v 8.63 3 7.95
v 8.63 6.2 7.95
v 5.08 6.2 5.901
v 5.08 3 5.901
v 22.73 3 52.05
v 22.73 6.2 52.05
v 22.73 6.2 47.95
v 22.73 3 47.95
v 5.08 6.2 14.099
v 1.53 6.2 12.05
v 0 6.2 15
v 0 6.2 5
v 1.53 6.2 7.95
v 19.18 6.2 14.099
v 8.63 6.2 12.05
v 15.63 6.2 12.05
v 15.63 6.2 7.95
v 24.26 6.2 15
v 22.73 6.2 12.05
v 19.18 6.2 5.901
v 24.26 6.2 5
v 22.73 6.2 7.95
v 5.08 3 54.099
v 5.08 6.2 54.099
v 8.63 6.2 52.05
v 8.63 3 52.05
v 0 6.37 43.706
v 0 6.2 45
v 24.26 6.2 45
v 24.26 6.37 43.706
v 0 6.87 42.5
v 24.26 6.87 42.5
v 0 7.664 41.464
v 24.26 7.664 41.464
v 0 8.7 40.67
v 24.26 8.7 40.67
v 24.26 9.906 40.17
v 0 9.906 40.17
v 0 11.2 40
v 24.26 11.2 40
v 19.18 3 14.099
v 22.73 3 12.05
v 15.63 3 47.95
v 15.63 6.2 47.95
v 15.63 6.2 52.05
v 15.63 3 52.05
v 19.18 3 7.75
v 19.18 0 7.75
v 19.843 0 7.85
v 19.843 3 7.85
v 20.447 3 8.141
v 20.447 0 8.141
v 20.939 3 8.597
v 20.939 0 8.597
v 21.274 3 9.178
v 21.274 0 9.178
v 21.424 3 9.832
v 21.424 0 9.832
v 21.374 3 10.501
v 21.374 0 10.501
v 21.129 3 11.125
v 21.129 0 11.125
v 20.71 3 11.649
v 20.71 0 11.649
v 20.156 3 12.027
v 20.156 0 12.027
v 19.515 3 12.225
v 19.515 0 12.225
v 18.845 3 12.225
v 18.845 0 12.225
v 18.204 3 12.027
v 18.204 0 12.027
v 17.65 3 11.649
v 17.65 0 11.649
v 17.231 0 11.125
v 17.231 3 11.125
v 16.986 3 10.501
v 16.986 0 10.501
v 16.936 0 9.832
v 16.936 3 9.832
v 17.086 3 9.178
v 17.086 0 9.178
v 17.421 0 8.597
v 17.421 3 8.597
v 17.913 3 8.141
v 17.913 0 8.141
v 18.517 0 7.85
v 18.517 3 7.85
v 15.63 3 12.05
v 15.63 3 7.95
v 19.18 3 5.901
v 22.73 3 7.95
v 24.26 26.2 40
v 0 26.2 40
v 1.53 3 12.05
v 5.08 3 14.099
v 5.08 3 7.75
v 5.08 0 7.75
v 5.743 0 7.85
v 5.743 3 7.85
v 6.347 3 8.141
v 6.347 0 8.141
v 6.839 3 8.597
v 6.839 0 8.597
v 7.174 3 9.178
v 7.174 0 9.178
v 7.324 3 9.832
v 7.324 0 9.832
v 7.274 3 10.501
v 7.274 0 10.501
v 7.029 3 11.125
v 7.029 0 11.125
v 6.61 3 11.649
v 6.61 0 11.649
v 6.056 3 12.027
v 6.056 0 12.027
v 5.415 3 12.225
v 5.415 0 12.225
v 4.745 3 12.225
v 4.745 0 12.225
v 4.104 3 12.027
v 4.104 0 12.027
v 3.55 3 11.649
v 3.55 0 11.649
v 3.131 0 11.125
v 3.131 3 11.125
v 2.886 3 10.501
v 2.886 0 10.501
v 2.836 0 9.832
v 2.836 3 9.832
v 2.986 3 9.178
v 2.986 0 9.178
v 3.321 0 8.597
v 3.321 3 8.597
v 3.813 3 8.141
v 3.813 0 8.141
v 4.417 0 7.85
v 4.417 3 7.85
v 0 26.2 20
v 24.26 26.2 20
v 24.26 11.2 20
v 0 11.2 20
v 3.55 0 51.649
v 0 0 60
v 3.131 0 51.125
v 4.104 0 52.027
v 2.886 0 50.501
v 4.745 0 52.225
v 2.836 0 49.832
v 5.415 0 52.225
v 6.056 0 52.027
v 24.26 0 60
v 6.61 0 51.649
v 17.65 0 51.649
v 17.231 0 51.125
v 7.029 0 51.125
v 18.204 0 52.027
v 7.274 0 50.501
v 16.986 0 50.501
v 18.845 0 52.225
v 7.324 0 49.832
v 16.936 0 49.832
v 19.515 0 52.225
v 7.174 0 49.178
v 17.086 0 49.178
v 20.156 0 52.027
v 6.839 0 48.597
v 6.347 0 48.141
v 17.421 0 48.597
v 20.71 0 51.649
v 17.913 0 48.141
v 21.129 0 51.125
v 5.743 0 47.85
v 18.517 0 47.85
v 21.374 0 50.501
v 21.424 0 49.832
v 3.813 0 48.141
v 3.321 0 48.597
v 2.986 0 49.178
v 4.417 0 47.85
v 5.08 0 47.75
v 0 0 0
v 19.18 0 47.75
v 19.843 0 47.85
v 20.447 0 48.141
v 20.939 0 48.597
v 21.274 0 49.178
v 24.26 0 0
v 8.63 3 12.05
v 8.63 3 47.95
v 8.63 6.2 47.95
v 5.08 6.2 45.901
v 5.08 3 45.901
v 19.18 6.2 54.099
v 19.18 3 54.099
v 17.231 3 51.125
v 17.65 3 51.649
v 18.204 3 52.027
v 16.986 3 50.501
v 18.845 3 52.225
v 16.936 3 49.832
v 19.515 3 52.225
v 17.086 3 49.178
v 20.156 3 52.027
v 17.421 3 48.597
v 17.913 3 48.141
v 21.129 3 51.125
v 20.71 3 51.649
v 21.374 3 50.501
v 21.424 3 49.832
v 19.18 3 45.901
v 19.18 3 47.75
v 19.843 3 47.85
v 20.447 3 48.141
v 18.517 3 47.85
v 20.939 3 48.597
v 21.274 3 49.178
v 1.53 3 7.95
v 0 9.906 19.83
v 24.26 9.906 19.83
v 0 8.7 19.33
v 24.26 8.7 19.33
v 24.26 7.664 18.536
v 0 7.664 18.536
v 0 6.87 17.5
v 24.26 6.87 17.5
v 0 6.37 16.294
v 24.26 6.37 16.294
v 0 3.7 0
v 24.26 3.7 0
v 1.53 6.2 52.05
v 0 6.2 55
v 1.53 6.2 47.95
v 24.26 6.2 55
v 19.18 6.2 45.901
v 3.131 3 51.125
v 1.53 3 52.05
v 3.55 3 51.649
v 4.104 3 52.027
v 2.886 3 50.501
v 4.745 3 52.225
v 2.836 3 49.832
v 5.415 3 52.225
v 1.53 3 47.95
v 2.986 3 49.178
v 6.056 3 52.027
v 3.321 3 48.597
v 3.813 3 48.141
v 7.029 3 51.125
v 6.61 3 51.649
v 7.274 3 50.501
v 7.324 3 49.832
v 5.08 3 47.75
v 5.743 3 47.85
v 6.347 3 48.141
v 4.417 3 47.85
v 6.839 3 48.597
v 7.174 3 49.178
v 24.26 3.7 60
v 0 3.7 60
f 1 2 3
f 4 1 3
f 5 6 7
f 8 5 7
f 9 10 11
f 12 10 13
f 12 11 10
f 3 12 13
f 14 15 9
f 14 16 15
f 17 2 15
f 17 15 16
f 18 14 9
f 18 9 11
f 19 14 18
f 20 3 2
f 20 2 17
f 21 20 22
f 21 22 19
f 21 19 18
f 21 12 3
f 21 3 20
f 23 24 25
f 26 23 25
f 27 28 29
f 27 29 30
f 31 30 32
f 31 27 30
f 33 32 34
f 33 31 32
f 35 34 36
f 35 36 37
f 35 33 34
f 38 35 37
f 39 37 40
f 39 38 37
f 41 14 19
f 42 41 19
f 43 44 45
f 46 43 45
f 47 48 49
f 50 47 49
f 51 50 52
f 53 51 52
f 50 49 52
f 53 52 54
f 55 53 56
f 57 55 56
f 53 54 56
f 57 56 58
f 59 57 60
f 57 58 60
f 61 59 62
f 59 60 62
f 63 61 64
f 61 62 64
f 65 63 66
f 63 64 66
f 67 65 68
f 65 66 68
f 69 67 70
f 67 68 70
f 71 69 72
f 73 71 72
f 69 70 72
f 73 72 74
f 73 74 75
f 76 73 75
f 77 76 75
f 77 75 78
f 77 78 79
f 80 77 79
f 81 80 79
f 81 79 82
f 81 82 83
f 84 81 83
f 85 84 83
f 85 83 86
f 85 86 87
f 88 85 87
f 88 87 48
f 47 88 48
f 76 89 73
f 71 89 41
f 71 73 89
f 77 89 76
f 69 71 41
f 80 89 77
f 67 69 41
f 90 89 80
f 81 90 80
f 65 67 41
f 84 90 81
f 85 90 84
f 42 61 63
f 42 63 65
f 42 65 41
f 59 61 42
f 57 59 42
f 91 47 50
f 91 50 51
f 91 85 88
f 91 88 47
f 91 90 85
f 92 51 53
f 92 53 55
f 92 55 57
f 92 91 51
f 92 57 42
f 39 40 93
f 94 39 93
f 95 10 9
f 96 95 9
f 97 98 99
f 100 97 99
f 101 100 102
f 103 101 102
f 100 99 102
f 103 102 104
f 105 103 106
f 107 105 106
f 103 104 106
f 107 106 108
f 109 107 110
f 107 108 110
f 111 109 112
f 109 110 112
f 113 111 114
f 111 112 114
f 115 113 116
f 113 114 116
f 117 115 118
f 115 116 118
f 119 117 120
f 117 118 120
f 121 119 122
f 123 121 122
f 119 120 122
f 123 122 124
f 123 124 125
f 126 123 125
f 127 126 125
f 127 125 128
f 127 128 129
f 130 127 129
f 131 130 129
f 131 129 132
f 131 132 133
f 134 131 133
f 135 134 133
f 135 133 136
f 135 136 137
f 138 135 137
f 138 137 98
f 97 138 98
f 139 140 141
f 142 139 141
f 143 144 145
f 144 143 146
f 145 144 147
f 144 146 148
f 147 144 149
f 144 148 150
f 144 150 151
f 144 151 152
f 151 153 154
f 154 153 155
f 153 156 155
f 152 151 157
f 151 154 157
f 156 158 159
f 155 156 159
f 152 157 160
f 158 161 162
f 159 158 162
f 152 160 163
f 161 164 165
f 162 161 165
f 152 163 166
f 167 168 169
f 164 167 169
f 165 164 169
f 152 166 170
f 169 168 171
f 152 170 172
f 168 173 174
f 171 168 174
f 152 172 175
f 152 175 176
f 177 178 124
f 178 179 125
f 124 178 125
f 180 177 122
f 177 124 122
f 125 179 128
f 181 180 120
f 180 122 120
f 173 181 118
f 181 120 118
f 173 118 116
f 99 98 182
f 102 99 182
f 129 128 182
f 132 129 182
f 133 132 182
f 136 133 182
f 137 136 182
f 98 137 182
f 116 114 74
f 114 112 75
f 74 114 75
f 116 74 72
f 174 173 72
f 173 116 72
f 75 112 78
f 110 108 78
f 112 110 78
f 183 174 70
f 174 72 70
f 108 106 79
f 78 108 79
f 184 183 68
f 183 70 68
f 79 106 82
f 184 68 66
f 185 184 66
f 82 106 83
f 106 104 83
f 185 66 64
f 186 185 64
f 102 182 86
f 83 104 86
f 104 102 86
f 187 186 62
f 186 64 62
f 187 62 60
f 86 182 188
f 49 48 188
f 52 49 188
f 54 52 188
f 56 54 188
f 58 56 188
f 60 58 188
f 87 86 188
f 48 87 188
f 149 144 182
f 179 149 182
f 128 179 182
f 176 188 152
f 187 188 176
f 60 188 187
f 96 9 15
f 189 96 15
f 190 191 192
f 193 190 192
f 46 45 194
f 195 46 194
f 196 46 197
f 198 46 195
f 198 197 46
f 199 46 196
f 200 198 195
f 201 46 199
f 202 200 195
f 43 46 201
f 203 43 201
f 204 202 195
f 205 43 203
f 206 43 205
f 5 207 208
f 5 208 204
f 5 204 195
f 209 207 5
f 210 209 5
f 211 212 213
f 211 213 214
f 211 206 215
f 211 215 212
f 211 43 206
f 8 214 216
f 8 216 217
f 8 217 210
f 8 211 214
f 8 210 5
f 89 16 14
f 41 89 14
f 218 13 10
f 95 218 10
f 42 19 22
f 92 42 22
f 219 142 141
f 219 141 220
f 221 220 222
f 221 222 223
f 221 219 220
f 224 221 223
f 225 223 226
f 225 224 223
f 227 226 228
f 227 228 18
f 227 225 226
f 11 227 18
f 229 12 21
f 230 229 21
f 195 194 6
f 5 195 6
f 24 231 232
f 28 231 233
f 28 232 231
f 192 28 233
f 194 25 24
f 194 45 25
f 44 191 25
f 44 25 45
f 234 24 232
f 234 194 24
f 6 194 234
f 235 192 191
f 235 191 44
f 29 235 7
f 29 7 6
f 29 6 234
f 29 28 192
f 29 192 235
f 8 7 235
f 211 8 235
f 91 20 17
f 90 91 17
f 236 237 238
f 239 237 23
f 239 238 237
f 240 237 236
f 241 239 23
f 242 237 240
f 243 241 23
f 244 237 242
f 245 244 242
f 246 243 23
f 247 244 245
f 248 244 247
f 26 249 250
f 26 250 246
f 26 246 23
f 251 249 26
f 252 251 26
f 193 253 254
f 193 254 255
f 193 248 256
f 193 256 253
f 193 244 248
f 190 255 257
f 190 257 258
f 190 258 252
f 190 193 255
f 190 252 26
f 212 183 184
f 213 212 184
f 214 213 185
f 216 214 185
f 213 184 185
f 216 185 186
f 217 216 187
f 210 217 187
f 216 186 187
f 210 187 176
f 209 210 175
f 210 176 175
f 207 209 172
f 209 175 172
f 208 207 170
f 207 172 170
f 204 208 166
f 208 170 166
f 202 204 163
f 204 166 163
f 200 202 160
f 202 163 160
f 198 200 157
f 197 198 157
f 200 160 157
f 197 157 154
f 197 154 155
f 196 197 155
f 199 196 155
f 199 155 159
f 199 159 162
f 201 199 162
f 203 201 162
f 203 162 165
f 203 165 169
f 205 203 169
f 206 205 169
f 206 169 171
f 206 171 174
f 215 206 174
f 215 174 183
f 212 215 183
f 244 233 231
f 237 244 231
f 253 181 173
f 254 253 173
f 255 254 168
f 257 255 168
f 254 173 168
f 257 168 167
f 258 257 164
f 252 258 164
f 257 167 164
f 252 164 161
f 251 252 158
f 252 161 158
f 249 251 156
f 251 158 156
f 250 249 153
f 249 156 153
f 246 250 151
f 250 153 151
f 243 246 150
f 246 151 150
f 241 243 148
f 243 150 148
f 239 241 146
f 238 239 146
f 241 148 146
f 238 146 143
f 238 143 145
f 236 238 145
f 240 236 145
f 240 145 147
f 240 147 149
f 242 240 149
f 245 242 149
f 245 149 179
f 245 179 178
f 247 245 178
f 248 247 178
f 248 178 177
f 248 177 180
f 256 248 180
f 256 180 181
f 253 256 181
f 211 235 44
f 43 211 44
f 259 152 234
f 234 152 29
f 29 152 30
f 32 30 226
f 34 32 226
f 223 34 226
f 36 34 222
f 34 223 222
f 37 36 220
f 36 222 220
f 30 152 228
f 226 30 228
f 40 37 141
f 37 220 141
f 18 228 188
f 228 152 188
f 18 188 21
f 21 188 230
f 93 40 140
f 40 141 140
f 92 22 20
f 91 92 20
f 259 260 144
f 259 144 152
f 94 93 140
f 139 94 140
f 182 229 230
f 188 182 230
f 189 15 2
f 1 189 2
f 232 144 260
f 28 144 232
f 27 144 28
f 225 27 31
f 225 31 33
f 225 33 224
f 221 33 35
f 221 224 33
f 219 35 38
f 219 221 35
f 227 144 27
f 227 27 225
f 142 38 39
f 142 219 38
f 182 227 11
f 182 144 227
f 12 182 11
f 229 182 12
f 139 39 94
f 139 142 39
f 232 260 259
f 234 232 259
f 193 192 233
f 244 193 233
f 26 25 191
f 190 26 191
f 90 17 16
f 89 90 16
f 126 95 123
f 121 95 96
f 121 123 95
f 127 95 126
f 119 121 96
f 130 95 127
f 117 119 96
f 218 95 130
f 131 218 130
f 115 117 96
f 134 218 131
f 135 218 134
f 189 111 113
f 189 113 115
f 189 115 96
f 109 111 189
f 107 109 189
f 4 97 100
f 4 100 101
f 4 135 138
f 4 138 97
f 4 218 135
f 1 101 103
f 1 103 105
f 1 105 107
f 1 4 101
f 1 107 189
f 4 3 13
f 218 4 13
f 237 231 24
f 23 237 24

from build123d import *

# Parameters (mm, degrees)
SKETCH_1_W          = 24.26
SKETCH_1_H          = 6.2
EXTRUDE_1_DEPTH     = 60
CUT_EXTRUDE_1_DEPTH = 3.2
HOLE_WIZARD_M41_D   = 4.5
EXTRUDE_2_DEPTH     = 24.26
CHAMFER_1_SIZE      = 2.5
CHAMFER_1_SIZE2     = 5
CHAMFER_2_SIZE      = 5
CHAMFER_2_SIZE2     = 2.5


with BuildPart() as part:
    # Эскиз1 → Бобышка-Вытянуть1 (new body)
    with BuildSketch(Plane.XY):
        with Locations((12.13, 3.1)):
            Rectangle(SKETCH_1_W, SKETCH_1_H)
    extrude(amount=EXTRUDE_1_DEPTH)

    # Эскиз2 → Вырез-Вытянуть1 (cut)
    with BuildSketch(Plane(origin=(0, 6.2, 0), x_dir=(1, 0, 0), z_dir=(0, 1, 0))):
        Polygon((1.53, -47.950406544), (1.53, -52.049593456), (5.08, -54.099186911), (8.63, -52.049593456), (8.63, -47.950406544), (5.08, -45.900813089), align=None)
        Polygon((15.63, -47.950406544), (15.63, -52.049593456), (19.18, -54.099186911), (22.73, -52.049593456), (22.73, -47.950406544), (19.18, -45.900813089), align=None)
        Polygon((15.63, -7.950406544), (15.63, -12.049593456), (19.18, -14.099186911), (22.73, -12.049593456), (22.73, -7.950406544), (19.18, -5.900813089), align=None)
        Polygon((5.08, -14.099186911), (8.63, -12.049593456), (8.63, -7.950406544), (5.08, -5.900813089), (1.53, -7.950406544), (1.53, -12.049593456), align=None)
    extrude(amount=-CUT_EXTRUDE_1_DEPTH, mode=Mode.SUBTRACT)

    # Отверстие с зазором M41 (through all)
    with Locations(Plane(origin=(5.08, 3, 50), x_dir=(0, 0, 1), z_dir=(0, 1, 0))):
        with Locations((0, 0), (0, 14.1), (-40, 0), (-40, 14.1)):
            Hole(HOLE_WIZARD_M41_D / 2)

    # Эскиз6 → Бобышка-Вытянуть2 (add)
    with BuildSketch(Plane.ZY):
        with BuildLine():
            Line((40, 26.2), (20, 26.2))
            Line((20, 26.2), (20, 11.2))
            ThreePointArc((20, 11.2), (18.535533906, 7.664466094), (15, 6.2))
            Line((15, 6.2), (45, 6.2))
            ThreePointArc((45, 6.2), (41.464466094, 7.664466094), (40, 11.2))
            Line((40, 11.2), (40, 26.2))
        make_face()
    extrude(amount=-EXTRUDE_2_DEPTH)

    # Фаска1
    chamfer_1_edges = [part.edges().sort_by_distance(p)[0] for p in [
        (12.13, 6.2, 0),
    ]]
    chamfer_1_side = [part.faces().sort_by_distance(p)[0] for p in [
        (12.13, 3.1, 0),
    ]]
    chamfer(chamfer_1_edges, length=CHAMFER_1_SIZE, length2=CHAMFER_1_SIZE2, reference=chamfer_1_side[0])

    # Фаска2
    chamfer_2_edges = [part.edges().sort_by_distance(p)[0] for p in [
        (12.13, 6.2, 60),
    ]]
    chamfer_2_side = [part.faces().sort_by_distance(p)[0] for p in [
        (12.13, 6.2, 53.289196352),
    ]]
    chamfer(chamfer_2_edges, length=CHAMFER_2_SIZE, length2=CHAMFER_2_SIZE2, reference=chamfer_2_side[0])


solid = part.part
